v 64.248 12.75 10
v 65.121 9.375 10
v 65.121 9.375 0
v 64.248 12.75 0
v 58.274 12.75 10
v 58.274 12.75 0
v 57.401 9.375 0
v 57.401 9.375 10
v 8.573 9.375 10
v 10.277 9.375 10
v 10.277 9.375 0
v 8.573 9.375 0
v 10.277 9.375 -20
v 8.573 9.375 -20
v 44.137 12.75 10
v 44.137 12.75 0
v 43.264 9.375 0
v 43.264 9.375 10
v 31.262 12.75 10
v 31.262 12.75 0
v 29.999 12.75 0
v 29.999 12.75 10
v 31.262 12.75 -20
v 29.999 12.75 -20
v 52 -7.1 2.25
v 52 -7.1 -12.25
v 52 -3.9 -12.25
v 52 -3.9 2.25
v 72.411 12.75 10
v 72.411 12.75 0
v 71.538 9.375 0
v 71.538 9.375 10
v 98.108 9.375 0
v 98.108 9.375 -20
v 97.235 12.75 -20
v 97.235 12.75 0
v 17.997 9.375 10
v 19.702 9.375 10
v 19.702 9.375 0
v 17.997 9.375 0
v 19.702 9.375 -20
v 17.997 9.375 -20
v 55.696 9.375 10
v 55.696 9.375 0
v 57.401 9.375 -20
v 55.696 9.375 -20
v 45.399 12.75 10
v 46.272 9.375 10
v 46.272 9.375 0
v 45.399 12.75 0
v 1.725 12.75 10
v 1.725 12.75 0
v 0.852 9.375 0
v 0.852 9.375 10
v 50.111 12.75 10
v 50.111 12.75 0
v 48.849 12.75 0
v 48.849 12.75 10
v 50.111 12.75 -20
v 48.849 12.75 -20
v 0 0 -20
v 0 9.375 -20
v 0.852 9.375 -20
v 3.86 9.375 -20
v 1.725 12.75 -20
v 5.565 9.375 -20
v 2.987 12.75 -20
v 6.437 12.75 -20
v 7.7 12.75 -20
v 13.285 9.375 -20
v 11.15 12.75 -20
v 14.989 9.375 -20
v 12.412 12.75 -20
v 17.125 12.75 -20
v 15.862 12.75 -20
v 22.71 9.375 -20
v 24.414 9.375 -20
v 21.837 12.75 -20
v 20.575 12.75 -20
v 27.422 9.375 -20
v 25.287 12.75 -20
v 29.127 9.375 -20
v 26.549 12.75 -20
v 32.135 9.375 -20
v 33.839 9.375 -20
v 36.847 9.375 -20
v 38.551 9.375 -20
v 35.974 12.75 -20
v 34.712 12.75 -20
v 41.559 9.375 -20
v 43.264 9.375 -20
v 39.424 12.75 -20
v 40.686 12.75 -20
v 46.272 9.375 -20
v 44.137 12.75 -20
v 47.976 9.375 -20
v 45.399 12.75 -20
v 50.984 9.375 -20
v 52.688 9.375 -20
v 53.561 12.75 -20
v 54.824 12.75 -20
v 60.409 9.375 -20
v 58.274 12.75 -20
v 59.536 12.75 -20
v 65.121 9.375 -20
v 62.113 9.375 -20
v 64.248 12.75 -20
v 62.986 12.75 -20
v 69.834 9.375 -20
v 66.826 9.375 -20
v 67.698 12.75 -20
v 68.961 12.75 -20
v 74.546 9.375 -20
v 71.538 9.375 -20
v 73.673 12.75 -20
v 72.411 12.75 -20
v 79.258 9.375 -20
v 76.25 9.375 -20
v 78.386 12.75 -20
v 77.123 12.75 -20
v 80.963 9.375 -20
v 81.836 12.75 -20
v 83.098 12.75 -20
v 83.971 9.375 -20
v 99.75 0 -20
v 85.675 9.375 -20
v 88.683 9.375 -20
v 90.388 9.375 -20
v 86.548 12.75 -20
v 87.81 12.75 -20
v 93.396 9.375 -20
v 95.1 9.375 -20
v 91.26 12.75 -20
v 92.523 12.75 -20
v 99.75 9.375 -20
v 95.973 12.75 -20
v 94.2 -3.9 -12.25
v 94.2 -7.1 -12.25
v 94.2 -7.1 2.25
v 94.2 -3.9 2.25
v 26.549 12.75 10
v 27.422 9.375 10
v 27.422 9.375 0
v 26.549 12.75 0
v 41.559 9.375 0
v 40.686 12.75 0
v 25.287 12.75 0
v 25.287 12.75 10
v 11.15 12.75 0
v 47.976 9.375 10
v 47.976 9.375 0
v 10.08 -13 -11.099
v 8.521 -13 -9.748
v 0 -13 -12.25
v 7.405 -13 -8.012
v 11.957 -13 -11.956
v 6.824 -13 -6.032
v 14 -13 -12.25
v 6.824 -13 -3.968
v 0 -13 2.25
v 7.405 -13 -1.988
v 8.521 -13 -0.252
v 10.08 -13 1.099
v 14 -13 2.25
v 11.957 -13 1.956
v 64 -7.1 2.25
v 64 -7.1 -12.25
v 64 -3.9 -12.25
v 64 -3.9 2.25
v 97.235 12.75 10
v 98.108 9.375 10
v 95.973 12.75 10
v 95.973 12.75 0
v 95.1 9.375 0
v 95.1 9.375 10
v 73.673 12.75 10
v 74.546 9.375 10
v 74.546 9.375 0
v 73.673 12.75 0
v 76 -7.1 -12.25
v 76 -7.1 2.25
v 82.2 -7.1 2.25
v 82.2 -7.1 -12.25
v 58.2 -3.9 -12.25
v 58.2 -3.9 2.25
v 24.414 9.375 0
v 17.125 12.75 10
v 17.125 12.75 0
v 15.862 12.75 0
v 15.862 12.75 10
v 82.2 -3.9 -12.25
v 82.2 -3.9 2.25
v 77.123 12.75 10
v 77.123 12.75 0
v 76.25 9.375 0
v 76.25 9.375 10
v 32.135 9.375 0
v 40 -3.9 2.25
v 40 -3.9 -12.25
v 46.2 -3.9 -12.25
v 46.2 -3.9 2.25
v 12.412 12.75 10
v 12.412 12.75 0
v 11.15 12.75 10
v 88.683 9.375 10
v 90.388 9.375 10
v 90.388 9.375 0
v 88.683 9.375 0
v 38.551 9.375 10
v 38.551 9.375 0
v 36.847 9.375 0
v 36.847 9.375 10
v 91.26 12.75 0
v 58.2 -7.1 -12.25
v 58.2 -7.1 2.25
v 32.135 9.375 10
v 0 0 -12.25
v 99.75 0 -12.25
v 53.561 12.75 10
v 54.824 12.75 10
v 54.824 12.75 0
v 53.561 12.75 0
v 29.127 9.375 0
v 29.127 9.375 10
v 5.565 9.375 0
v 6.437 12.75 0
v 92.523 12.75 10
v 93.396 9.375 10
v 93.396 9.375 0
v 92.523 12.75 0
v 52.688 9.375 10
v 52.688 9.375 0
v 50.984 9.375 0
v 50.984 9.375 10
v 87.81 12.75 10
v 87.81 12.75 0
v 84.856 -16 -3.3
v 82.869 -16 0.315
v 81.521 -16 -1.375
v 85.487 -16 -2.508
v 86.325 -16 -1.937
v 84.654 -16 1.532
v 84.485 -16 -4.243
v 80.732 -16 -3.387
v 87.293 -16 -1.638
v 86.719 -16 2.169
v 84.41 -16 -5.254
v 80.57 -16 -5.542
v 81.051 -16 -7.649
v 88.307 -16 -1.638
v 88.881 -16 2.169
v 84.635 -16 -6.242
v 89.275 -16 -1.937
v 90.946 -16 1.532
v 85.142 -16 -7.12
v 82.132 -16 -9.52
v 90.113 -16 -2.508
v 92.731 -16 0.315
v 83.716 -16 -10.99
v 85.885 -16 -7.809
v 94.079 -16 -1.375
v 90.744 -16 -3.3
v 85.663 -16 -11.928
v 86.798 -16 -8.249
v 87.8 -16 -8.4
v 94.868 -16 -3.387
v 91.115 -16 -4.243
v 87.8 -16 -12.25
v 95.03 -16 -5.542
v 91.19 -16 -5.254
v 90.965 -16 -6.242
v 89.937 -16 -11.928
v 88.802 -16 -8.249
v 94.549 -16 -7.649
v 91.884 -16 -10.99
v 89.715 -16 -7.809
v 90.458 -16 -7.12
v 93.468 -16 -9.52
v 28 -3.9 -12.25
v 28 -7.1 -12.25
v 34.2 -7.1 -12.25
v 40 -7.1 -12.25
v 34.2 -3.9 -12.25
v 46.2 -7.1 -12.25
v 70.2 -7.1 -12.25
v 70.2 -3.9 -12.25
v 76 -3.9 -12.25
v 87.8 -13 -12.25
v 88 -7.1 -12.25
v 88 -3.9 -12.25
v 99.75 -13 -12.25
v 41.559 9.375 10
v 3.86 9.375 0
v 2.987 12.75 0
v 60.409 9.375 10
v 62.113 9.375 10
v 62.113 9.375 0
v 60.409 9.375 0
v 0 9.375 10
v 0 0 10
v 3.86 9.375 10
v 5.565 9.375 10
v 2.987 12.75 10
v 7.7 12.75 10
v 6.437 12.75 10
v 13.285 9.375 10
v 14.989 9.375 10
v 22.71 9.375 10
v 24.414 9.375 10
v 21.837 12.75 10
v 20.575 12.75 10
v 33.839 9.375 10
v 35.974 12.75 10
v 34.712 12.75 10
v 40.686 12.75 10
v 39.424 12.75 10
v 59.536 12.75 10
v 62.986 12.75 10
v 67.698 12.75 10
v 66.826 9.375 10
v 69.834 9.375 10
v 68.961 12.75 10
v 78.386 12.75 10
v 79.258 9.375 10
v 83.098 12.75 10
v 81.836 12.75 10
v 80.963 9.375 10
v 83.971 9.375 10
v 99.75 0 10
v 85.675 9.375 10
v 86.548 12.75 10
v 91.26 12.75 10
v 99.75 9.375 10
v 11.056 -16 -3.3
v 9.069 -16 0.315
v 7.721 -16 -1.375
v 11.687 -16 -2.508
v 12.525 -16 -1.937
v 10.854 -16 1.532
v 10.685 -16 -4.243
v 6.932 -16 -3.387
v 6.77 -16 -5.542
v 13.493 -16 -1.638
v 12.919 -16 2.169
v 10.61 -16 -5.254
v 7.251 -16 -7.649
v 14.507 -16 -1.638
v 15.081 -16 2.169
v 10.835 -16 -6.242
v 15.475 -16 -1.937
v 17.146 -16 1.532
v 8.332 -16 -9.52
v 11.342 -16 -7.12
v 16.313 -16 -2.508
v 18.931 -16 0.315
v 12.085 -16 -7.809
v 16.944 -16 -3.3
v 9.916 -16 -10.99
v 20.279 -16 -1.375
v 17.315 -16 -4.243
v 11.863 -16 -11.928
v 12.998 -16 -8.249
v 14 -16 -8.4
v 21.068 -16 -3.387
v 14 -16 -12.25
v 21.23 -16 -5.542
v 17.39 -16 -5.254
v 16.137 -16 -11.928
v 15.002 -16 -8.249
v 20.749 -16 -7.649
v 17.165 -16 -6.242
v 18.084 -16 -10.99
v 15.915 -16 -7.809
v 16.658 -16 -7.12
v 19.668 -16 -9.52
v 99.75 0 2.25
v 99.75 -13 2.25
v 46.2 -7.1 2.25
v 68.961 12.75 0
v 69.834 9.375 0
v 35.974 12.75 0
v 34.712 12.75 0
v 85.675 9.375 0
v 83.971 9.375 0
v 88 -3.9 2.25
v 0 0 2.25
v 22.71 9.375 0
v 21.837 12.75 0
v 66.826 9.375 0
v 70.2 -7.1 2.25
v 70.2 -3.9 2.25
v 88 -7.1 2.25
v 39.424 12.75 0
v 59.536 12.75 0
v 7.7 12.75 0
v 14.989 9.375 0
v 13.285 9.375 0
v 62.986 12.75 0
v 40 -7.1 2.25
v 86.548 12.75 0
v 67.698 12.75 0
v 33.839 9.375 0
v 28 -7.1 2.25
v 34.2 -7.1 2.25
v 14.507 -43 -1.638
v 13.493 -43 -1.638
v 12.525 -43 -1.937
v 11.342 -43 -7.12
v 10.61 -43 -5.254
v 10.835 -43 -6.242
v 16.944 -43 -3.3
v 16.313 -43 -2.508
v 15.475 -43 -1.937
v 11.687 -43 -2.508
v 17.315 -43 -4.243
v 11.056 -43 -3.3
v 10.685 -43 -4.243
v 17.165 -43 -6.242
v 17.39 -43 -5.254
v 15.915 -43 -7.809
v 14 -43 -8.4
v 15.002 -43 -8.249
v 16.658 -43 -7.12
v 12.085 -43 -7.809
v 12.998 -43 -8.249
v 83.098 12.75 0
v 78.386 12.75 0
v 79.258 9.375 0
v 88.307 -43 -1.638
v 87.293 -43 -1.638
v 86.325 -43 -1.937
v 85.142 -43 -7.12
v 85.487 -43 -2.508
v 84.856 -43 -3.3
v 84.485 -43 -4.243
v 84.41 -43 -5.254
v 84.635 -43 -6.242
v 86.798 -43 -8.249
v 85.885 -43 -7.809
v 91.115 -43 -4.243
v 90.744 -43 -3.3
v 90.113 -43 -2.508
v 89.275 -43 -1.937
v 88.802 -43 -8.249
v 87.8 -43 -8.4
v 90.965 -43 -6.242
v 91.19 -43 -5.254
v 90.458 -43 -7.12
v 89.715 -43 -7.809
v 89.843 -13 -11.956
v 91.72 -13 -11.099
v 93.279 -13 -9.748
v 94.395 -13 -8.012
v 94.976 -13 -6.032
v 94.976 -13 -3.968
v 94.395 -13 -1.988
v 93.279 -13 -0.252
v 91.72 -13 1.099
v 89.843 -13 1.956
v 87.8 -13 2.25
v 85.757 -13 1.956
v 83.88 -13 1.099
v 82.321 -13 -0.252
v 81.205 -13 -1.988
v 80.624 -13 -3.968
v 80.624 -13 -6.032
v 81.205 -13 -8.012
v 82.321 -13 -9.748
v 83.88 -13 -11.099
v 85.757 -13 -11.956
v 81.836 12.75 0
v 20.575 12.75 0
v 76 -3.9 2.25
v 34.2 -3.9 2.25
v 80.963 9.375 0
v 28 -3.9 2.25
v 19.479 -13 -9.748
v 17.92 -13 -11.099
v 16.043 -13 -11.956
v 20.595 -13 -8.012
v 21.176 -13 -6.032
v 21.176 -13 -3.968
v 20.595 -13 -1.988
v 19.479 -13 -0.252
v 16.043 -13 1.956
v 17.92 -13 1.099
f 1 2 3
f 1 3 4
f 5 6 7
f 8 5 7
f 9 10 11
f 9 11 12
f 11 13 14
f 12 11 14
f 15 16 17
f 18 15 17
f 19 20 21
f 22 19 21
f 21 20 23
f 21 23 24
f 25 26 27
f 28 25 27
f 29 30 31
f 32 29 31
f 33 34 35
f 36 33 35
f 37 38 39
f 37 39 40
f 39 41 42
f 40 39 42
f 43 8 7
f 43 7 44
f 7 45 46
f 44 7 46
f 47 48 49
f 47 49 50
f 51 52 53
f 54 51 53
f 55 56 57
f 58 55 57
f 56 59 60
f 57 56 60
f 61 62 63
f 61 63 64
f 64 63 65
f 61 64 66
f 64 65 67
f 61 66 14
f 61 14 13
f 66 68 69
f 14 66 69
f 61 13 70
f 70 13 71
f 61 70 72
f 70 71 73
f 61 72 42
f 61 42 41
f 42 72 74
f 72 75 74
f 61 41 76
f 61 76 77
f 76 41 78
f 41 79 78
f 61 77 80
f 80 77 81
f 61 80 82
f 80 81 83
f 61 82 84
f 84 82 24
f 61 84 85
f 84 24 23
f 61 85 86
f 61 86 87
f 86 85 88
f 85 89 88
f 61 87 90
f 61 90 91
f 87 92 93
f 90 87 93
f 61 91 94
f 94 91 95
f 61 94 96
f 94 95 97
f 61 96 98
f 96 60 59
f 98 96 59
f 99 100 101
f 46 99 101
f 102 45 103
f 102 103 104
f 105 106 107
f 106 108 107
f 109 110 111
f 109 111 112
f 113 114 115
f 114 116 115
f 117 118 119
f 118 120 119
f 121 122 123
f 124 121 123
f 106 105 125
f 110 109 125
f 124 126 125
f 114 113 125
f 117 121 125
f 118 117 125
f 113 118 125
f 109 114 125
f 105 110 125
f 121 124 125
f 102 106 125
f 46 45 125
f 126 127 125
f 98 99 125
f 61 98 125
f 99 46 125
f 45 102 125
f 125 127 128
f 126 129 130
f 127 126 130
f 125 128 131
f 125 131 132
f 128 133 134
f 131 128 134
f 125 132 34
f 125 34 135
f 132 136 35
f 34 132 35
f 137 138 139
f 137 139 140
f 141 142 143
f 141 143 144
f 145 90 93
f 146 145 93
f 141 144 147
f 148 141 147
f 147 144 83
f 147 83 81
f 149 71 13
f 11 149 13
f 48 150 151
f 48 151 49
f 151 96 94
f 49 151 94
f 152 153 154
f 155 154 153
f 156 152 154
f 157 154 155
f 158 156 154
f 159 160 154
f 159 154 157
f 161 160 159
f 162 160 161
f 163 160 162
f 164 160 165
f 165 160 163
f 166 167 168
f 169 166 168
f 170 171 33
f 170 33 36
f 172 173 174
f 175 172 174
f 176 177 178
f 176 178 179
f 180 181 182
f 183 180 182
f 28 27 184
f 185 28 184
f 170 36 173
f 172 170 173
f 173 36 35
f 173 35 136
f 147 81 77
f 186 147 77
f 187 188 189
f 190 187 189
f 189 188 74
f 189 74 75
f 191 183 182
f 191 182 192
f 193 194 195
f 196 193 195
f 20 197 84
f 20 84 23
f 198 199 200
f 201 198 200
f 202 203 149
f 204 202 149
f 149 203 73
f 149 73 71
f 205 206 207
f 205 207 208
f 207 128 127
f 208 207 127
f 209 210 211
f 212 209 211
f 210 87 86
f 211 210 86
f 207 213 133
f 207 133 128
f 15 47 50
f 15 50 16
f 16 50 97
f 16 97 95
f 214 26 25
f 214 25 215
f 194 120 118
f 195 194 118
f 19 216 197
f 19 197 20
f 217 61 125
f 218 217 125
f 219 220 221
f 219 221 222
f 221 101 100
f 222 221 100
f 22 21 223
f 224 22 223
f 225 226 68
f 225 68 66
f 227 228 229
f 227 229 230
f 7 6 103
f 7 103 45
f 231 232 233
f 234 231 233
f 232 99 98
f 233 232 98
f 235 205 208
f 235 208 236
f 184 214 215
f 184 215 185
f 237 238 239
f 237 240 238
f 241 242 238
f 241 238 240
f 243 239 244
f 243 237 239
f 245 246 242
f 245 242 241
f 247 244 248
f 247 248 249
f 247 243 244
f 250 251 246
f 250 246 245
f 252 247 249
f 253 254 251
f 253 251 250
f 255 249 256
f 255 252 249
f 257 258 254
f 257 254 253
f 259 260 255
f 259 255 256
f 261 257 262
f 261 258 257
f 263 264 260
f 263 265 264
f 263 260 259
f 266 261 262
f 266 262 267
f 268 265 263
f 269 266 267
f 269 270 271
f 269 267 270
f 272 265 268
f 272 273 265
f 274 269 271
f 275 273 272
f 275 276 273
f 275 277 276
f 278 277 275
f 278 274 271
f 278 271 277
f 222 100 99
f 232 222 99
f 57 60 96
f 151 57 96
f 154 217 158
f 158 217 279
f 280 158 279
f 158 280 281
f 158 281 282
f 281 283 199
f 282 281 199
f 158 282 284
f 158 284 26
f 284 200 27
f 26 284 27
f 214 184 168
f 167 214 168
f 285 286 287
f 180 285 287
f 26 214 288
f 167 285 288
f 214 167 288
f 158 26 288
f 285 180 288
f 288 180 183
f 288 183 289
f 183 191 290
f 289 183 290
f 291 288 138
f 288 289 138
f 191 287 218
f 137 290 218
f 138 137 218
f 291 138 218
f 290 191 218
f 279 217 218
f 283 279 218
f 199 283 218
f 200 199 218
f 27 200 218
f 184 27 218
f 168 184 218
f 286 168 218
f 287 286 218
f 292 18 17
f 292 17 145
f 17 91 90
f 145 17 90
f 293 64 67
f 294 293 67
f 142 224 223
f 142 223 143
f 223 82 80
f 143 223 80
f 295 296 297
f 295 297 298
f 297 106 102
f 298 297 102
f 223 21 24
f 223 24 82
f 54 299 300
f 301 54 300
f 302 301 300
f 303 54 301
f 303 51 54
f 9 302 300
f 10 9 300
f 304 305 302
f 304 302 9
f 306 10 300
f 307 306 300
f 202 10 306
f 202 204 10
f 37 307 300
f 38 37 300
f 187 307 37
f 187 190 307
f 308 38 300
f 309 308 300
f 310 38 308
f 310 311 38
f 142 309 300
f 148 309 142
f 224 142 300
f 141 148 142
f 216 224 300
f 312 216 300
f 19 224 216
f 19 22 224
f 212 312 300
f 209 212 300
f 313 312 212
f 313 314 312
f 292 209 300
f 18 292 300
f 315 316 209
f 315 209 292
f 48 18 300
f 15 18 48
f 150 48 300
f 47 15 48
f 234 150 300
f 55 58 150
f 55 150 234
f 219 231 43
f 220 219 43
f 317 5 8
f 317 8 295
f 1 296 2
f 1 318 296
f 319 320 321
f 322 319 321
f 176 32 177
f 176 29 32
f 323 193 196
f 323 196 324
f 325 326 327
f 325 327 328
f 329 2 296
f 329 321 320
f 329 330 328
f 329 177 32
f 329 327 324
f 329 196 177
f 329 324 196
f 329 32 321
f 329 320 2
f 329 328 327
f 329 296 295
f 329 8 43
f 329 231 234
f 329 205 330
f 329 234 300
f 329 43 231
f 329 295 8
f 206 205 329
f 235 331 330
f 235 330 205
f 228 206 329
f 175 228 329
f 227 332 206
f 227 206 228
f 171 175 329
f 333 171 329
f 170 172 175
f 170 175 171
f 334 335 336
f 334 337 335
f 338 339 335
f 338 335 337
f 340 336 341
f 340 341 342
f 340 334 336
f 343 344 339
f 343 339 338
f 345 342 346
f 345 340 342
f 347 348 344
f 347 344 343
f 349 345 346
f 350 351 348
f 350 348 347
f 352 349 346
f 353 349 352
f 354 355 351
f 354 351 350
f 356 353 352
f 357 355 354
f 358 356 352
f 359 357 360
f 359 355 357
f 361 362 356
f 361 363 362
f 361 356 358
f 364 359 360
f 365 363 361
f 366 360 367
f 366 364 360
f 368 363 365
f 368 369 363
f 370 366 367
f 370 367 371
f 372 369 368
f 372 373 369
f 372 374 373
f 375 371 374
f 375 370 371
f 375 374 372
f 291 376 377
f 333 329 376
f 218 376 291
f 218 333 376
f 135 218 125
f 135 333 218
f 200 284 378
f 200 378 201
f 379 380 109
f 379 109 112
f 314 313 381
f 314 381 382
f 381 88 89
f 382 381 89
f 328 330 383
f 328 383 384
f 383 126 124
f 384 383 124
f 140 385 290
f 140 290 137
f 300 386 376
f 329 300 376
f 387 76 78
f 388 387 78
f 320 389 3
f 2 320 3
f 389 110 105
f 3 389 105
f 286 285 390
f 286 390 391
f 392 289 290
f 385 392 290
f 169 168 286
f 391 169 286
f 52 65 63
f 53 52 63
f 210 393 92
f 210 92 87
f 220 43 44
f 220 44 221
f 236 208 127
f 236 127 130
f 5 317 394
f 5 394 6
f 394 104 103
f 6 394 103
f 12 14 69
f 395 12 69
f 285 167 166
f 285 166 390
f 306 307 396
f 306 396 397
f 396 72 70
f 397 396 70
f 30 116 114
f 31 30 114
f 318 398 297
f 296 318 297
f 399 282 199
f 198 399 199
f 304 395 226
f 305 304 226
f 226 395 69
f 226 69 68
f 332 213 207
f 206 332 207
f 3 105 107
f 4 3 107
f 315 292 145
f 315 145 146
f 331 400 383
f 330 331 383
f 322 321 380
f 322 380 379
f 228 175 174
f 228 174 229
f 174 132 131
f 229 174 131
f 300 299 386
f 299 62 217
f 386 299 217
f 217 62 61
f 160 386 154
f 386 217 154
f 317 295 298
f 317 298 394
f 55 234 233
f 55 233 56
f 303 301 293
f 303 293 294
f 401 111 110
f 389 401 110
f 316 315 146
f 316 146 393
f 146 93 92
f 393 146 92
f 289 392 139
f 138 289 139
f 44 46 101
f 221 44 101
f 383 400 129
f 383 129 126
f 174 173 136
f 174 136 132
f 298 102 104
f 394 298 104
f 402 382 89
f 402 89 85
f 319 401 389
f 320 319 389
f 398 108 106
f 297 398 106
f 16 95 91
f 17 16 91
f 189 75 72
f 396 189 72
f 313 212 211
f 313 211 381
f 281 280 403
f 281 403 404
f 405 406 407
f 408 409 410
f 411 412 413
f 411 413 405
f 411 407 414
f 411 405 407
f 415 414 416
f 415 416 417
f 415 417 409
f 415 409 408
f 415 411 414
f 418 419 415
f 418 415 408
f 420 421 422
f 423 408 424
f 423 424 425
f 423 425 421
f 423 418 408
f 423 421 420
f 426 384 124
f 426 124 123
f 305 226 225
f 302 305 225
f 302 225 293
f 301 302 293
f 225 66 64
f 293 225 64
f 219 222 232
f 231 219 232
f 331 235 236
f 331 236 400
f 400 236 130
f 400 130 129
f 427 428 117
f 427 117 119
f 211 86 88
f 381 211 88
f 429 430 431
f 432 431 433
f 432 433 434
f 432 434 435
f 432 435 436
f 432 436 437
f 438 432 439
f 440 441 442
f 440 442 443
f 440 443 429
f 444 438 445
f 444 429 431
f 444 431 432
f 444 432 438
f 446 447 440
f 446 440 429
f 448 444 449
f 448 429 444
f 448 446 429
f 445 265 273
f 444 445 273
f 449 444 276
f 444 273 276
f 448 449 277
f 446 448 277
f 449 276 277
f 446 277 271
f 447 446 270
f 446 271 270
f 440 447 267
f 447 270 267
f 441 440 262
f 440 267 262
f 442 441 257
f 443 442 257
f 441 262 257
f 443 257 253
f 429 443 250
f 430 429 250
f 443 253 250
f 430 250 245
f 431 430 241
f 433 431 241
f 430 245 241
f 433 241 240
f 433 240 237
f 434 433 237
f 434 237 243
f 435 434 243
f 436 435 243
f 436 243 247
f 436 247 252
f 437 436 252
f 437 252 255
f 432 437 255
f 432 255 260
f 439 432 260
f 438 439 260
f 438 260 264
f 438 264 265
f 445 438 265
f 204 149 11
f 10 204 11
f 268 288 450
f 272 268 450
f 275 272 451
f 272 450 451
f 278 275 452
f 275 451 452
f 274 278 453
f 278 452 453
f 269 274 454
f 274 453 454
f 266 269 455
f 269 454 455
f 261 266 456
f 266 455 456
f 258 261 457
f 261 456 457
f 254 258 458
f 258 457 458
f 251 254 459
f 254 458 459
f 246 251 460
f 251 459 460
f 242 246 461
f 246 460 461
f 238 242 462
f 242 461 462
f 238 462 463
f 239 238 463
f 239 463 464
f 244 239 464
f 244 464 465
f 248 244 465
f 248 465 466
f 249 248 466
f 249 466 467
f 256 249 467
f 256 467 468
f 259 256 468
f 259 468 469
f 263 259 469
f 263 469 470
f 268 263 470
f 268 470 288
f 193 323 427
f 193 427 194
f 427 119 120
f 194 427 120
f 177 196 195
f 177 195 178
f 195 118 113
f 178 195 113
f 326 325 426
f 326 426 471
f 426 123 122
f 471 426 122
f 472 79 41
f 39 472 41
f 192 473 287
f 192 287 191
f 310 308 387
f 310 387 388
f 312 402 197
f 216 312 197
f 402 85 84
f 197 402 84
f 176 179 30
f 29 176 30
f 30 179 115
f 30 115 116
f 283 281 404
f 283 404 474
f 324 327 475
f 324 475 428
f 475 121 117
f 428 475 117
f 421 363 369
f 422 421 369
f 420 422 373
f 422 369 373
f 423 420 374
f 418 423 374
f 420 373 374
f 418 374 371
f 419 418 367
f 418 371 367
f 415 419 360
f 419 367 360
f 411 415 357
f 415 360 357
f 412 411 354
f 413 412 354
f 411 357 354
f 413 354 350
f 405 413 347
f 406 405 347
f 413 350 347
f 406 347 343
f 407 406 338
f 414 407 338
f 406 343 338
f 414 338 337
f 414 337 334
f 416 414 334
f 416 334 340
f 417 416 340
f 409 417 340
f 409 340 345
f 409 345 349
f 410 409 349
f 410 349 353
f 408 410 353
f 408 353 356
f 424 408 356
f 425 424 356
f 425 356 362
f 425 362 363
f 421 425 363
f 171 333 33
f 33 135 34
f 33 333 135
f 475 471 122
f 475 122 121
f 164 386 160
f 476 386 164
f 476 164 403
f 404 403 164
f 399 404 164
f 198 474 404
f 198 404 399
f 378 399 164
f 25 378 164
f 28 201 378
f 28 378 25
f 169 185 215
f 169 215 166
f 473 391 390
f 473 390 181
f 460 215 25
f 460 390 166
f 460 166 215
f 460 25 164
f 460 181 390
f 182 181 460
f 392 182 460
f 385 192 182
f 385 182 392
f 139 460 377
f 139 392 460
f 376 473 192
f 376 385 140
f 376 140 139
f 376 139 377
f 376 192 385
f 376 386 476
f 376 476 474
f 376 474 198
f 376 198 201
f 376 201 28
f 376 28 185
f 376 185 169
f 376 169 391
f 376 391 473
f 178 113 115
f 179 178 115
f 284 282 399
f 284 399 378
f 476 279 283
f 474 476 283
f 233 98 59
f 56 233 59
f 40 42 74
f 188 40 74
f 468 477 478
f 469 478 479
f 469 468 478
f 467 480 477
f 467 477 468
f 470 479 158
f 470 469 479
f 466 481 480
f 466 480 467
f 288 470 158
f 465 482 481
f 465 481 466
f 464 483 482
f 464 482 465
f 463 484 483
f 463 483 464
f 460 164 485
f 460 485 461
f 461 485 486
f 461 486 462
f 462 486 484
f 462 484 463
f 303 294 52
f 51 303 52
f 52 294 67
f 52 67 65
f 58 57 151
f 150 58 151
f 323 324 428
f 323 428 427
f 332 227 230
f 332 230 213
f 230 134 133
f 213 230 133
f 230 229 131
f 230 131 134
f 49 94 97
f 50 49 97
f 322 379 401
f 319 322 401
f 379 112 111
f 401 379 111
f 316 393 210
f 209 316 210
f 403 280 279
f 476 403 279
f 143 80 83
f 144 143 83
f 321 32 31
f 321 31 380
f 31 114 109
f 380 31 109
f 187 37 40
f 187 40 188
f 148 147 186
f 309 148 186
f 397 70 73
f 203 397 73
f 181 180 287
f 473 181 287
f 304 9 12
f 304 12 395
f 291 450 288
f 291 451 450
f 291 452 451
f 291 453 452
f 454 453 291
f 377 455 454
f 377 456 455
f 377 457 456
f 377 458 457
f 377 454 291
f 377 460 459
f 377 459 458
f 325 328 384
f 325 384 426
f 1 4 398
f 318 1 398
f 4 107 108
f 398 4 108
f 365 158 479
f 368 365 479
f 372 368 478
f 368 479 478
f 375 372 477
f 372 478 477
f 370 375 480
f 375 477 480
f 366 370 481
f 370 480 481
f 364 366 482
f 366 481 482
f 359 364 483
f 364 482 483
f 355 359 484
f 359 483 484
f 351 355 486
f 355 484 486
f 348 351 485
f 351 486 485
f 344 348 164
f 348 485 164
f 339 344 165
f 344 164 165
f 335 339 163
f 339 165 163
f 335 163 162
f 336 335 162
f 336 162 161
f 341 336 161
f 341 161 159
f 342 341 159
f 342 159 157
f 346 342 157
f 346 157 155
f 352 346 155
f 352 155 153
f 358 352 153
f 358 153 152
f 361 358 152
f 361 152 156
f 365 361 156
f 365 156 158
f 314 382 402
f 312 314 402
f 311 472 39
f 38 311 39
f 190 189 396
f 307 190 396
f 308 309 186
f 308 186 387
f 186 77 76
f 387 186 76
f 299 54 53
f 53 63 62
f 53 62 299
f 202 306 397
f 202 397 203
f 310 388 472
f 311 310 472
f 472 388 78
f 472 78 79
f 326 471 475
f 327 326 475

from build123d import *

# Parameters (mm, degrees)
BLANKSKE_W                 = 100
BLANKSKE_H                 = 12.75
BLANK_DEPTH                = 20
TOOTHCUTSIM_DEPTH          = 103.77432802
TEETHCUTS_COUNT            = 22
TEETHCUTS_PITCH            = 4.712388975
SALIENTE_EXTRUIR1_DEPTH    = 10
CORTAR_EXTRUIR1_DEPTH      = 103.77432802
CORTAR_EXTRUIR1_DEPTH_BACK = 0.25
CROQUIS12_W                = 30
CROQUIS12_H                = 10.100558753
CROQUIS13_W                = 99.75
CROQUIS13_H                = 14.5
SALIENTE_EXTRUIR6_DEPTH    = 13
CROQUIS14_R                = 7.25
CROQUIS14_R_2              = 3.4
SALIENTE_EXTRUIR7_DEPTH    = 3
CROQUIS15_R                = 3.4
SALIENTE_EXTRUIR8_DEPTH    = 30
CORTAR_EXTRUIR2_DEPTH      = 111.878875355
CORTAR_EXTRUIR2_DEPTH_BACK = 111.878875355
CROQUIS16_W                = 6.2
CROQUIS16_H                = 3.2


with BuildPart() as part:
    # BlankSke → Blank (new body)
    with BuildSketch(Plane.XY):
        with Locations((50, 6.375)):
            Rectangle(BLANKSKE_W, BLANKSKE_H)
    extrude(amount=-BLANK_DEPTH)

    # TooCutSkeSim → ToothCutSim (cut, through all)
    with BuildSketch(Plane.XY):
        Polygon((0.852189273, 9.375), (-0.852189273, 9.375), (-1.731592507, 12.7754), (1.731592507, 12.7754), align=None)
    toothcutsim = extrude(amount=-TOOTHCUTSIM_DEPTH, mode=Mode.SUBTRACT)

    # TeethCuts: ToothCutSim ×22
    with Locations(*[(i * TEETHCUTS_PITCH, 0, 0) for i in range(1, TEETHCUTS_COUNT)]):
        add(toothcutsim, mode=Mode.SUBTRACT)

    # Croquis1 → Saliente-Extruir1 (add)
    with BuildSketch(Plane.XY):
        Polygon((99.812357748, 9.375), (98.107979202, 9.375), (97.235144855, 12.75), (95.97280312, 12.75), (95.099968773, 9.375), (93.395590227, 9.375), (92.52275588, 12.75), (91.260414145, 12.75), (90.387579798, 9.375), (88.683201252, 9.375), (87.810366905, 12.75), (86.54802517, 12.75), (85.675190823, 9.375), (83.970812277, 9.375), (83.09797793, 12.75), (81.835636195, 12.75), (80.962801848, 9.375), (79.258423302, 9.375), (78.385588955, 12.75), (77.12324722, 12.75), (76.250412873, 9.375), (74.546034327, 9.375), (73.67319998, 12.75), (72.410858245, 12.75), (71.538023898, 9.375), (69.833645352, 9.375), (68.960811005, 12.75), (67.69846927, 12.75), (66.825634923, 9.375), (65.121256377, 9.375), (64.24842203, 12.75), (62.986080295, 12.75), (62.113245948, 9.375), (60.408867402, 9.375), (59.536033055, 12.75), (58.27369132, 12.75), (57.400856973, 9.375), (55.696478427, 9.375), (54.82364408, 12.75), (53.561302345, 12.75), (52.688467998, 9.375), (50.984089452, 9.375), (50.111255105, 12.75), (48.84891337, 12.75), (47.976079023, 9.375), (46.271700477, 9.375), (45.39886613, 12.75), (44.136524395, 12.75), (43.263690048, 9.375), (41.559311502, 9.375), (40.686477155, 12.75), (39.42413542, 12.75), (38.551301073, 9.375), (36.846922527, 9.375), (35.97408818, 12.75), (34.711746445, 12.75), (33.838912098, 9.375), (32.134533552, 9.375), (31.261699205, 12.75), (29.99935747, 12.75), (29.126523123, 9.375), (27.422144577, 9.375), (26.54931023, 12.75), (25.286968495, 12.75), (24.414134148, 9.375), (22.709755602, 9.375), (21.836921255, 12.75), (20.57457952, 12.75), (19.701745173, 9.375), (17.997366627, 9.375), (17.12453228, 12.75), (15.862190545, 12.75), (14.989356198, 9.375), (13.284977652, 9.375), (12.412143305, 12.75), (11.14980157, 12.75), (10.276967223, 9.375), (8.572588677, 9.375), (7.69975433, 12.75), (6.437412595, 12.75), (5.564578248, 9.375), (3.860199702, 9.375), (2.987365355, 12.75), (1.72502362, 12.75), (0.852189273, 9.375), (0, 9.375), (0, 0), (100, 0), (100, 10.100558753), align=None)
    extrude(amount=SALIENTE_EXTRUIR1_DEPTH)

    # Croquis12 → Cortar-Extruir1 (cut, two sides: drawn at the far end of the back side and taken through both)
    with BuildSketch(Plane(origin=(100, 0, 0), x_dir=(0, 0, -1), z_dir=(1, 0, 0)).offset(-CORTAR_EXTRUIR1_DEPTH_BACK)):
        with Locations((5, 5.050279377)):
            Rectangle(CROQUIS12_W, CROQUIS12_H)
    extrude(amount=CORTAR_EXTRUIR1_DEPTH + CORTAR_EXTRUIR1_DEPTH_BACK, mode=Mode.SUBTRACT)

    # Croquis13 → Saliente-Extruir6 (add)
    with BuildSketch(Plane.XZ):
        with Locations((49.875, -5)):
            Rectangle(CROQUIS13_W, CROQUIS13_H)
    extrude(amount=SALIENTE_EXTRUIR6_DEPTH)

    # Croquis14 → Saliente-Extruir7 (add)
    # profile 1 of 2: a face of its own
    with BuildSketch(Plane.XZ.offset(13)):
        with Locations(Location((14, -5, 0), (0, 0, 270))):
            Circle(CROQUIS14_R)
        with Locations(Location((14, -5, 0), (0, 0, 270))):
            Circle(CROQUIS14_R_2, mode=Mode.SUBTRACT)
    # profile 2 of 2: a face of its own
    with BuildSketch(Plane.XZ.offset(13)):
        with Locations(Location((87.8, -5, 0), (0, 0, 270))):
            Circle(CROQUIS14_R)
        with Locations(Location((87.8, -5, 0), (0, 0, 270))):
            Circle(CROQUIS14_R_2, mode=Mode.SUBTRACT)
    extrude(amount=SALIENTE_EXTRUIR7_DEPTH)

    # Croquis15 → Saliente-Extruir8 (add)
    with BuildSketch(Plane.XZ.offset(13)):
        with Locations(Location((87.8, -5, 0), (0, 0, 270))):
            Circle(CROQUIS15_R)
        with Locations(Location((14, -5, 0), (0, 0, 270))):
            Circle(CROQUIS15_R)
    extrude(amount=SALIENTE_EXTRUIR8_DEPTH)

    # Croquis16 → Cortar-Extruir2 (cut, two sides: drawn at the far end of the back side and taken through both)
    with BuildSketch(Plane.XY.offset(2.25).offset(-CORTAR_EXTRUIR2_DEPTH_BACK)):
        with Locations((43.1, -5.5)):
            Rectangle(CROQUIS16_W, CROQUIS16_H)
        with Locations((31.1, -5.5)):
            Rectangle(CROQUIS16_W, CROQUIS16_H)
        with Locations((55.1, -5.5)):
            Rectangle(CROQUIS16_W, CROQUIS16_H)
        with Locations((67.1, -5.5)):
            Rectangle(CROQUIS16_W, CROQUIS16_H)
        with Locations((79.1, -5.5)):
            Rectangle(CROQUIS16_W, CROQUIS16_H)
        with Locations((91.1, -5.5)):
            Rectangle(CROQUIS16_W, CROQUIS16_H)
    extrude(amount=CORTAR_EXTRUIR2_DEPTH + CORTAR_EXTRUIR2_DEPTH_BACK, mode=Mode.SUBTRACT)


solid = part.part
